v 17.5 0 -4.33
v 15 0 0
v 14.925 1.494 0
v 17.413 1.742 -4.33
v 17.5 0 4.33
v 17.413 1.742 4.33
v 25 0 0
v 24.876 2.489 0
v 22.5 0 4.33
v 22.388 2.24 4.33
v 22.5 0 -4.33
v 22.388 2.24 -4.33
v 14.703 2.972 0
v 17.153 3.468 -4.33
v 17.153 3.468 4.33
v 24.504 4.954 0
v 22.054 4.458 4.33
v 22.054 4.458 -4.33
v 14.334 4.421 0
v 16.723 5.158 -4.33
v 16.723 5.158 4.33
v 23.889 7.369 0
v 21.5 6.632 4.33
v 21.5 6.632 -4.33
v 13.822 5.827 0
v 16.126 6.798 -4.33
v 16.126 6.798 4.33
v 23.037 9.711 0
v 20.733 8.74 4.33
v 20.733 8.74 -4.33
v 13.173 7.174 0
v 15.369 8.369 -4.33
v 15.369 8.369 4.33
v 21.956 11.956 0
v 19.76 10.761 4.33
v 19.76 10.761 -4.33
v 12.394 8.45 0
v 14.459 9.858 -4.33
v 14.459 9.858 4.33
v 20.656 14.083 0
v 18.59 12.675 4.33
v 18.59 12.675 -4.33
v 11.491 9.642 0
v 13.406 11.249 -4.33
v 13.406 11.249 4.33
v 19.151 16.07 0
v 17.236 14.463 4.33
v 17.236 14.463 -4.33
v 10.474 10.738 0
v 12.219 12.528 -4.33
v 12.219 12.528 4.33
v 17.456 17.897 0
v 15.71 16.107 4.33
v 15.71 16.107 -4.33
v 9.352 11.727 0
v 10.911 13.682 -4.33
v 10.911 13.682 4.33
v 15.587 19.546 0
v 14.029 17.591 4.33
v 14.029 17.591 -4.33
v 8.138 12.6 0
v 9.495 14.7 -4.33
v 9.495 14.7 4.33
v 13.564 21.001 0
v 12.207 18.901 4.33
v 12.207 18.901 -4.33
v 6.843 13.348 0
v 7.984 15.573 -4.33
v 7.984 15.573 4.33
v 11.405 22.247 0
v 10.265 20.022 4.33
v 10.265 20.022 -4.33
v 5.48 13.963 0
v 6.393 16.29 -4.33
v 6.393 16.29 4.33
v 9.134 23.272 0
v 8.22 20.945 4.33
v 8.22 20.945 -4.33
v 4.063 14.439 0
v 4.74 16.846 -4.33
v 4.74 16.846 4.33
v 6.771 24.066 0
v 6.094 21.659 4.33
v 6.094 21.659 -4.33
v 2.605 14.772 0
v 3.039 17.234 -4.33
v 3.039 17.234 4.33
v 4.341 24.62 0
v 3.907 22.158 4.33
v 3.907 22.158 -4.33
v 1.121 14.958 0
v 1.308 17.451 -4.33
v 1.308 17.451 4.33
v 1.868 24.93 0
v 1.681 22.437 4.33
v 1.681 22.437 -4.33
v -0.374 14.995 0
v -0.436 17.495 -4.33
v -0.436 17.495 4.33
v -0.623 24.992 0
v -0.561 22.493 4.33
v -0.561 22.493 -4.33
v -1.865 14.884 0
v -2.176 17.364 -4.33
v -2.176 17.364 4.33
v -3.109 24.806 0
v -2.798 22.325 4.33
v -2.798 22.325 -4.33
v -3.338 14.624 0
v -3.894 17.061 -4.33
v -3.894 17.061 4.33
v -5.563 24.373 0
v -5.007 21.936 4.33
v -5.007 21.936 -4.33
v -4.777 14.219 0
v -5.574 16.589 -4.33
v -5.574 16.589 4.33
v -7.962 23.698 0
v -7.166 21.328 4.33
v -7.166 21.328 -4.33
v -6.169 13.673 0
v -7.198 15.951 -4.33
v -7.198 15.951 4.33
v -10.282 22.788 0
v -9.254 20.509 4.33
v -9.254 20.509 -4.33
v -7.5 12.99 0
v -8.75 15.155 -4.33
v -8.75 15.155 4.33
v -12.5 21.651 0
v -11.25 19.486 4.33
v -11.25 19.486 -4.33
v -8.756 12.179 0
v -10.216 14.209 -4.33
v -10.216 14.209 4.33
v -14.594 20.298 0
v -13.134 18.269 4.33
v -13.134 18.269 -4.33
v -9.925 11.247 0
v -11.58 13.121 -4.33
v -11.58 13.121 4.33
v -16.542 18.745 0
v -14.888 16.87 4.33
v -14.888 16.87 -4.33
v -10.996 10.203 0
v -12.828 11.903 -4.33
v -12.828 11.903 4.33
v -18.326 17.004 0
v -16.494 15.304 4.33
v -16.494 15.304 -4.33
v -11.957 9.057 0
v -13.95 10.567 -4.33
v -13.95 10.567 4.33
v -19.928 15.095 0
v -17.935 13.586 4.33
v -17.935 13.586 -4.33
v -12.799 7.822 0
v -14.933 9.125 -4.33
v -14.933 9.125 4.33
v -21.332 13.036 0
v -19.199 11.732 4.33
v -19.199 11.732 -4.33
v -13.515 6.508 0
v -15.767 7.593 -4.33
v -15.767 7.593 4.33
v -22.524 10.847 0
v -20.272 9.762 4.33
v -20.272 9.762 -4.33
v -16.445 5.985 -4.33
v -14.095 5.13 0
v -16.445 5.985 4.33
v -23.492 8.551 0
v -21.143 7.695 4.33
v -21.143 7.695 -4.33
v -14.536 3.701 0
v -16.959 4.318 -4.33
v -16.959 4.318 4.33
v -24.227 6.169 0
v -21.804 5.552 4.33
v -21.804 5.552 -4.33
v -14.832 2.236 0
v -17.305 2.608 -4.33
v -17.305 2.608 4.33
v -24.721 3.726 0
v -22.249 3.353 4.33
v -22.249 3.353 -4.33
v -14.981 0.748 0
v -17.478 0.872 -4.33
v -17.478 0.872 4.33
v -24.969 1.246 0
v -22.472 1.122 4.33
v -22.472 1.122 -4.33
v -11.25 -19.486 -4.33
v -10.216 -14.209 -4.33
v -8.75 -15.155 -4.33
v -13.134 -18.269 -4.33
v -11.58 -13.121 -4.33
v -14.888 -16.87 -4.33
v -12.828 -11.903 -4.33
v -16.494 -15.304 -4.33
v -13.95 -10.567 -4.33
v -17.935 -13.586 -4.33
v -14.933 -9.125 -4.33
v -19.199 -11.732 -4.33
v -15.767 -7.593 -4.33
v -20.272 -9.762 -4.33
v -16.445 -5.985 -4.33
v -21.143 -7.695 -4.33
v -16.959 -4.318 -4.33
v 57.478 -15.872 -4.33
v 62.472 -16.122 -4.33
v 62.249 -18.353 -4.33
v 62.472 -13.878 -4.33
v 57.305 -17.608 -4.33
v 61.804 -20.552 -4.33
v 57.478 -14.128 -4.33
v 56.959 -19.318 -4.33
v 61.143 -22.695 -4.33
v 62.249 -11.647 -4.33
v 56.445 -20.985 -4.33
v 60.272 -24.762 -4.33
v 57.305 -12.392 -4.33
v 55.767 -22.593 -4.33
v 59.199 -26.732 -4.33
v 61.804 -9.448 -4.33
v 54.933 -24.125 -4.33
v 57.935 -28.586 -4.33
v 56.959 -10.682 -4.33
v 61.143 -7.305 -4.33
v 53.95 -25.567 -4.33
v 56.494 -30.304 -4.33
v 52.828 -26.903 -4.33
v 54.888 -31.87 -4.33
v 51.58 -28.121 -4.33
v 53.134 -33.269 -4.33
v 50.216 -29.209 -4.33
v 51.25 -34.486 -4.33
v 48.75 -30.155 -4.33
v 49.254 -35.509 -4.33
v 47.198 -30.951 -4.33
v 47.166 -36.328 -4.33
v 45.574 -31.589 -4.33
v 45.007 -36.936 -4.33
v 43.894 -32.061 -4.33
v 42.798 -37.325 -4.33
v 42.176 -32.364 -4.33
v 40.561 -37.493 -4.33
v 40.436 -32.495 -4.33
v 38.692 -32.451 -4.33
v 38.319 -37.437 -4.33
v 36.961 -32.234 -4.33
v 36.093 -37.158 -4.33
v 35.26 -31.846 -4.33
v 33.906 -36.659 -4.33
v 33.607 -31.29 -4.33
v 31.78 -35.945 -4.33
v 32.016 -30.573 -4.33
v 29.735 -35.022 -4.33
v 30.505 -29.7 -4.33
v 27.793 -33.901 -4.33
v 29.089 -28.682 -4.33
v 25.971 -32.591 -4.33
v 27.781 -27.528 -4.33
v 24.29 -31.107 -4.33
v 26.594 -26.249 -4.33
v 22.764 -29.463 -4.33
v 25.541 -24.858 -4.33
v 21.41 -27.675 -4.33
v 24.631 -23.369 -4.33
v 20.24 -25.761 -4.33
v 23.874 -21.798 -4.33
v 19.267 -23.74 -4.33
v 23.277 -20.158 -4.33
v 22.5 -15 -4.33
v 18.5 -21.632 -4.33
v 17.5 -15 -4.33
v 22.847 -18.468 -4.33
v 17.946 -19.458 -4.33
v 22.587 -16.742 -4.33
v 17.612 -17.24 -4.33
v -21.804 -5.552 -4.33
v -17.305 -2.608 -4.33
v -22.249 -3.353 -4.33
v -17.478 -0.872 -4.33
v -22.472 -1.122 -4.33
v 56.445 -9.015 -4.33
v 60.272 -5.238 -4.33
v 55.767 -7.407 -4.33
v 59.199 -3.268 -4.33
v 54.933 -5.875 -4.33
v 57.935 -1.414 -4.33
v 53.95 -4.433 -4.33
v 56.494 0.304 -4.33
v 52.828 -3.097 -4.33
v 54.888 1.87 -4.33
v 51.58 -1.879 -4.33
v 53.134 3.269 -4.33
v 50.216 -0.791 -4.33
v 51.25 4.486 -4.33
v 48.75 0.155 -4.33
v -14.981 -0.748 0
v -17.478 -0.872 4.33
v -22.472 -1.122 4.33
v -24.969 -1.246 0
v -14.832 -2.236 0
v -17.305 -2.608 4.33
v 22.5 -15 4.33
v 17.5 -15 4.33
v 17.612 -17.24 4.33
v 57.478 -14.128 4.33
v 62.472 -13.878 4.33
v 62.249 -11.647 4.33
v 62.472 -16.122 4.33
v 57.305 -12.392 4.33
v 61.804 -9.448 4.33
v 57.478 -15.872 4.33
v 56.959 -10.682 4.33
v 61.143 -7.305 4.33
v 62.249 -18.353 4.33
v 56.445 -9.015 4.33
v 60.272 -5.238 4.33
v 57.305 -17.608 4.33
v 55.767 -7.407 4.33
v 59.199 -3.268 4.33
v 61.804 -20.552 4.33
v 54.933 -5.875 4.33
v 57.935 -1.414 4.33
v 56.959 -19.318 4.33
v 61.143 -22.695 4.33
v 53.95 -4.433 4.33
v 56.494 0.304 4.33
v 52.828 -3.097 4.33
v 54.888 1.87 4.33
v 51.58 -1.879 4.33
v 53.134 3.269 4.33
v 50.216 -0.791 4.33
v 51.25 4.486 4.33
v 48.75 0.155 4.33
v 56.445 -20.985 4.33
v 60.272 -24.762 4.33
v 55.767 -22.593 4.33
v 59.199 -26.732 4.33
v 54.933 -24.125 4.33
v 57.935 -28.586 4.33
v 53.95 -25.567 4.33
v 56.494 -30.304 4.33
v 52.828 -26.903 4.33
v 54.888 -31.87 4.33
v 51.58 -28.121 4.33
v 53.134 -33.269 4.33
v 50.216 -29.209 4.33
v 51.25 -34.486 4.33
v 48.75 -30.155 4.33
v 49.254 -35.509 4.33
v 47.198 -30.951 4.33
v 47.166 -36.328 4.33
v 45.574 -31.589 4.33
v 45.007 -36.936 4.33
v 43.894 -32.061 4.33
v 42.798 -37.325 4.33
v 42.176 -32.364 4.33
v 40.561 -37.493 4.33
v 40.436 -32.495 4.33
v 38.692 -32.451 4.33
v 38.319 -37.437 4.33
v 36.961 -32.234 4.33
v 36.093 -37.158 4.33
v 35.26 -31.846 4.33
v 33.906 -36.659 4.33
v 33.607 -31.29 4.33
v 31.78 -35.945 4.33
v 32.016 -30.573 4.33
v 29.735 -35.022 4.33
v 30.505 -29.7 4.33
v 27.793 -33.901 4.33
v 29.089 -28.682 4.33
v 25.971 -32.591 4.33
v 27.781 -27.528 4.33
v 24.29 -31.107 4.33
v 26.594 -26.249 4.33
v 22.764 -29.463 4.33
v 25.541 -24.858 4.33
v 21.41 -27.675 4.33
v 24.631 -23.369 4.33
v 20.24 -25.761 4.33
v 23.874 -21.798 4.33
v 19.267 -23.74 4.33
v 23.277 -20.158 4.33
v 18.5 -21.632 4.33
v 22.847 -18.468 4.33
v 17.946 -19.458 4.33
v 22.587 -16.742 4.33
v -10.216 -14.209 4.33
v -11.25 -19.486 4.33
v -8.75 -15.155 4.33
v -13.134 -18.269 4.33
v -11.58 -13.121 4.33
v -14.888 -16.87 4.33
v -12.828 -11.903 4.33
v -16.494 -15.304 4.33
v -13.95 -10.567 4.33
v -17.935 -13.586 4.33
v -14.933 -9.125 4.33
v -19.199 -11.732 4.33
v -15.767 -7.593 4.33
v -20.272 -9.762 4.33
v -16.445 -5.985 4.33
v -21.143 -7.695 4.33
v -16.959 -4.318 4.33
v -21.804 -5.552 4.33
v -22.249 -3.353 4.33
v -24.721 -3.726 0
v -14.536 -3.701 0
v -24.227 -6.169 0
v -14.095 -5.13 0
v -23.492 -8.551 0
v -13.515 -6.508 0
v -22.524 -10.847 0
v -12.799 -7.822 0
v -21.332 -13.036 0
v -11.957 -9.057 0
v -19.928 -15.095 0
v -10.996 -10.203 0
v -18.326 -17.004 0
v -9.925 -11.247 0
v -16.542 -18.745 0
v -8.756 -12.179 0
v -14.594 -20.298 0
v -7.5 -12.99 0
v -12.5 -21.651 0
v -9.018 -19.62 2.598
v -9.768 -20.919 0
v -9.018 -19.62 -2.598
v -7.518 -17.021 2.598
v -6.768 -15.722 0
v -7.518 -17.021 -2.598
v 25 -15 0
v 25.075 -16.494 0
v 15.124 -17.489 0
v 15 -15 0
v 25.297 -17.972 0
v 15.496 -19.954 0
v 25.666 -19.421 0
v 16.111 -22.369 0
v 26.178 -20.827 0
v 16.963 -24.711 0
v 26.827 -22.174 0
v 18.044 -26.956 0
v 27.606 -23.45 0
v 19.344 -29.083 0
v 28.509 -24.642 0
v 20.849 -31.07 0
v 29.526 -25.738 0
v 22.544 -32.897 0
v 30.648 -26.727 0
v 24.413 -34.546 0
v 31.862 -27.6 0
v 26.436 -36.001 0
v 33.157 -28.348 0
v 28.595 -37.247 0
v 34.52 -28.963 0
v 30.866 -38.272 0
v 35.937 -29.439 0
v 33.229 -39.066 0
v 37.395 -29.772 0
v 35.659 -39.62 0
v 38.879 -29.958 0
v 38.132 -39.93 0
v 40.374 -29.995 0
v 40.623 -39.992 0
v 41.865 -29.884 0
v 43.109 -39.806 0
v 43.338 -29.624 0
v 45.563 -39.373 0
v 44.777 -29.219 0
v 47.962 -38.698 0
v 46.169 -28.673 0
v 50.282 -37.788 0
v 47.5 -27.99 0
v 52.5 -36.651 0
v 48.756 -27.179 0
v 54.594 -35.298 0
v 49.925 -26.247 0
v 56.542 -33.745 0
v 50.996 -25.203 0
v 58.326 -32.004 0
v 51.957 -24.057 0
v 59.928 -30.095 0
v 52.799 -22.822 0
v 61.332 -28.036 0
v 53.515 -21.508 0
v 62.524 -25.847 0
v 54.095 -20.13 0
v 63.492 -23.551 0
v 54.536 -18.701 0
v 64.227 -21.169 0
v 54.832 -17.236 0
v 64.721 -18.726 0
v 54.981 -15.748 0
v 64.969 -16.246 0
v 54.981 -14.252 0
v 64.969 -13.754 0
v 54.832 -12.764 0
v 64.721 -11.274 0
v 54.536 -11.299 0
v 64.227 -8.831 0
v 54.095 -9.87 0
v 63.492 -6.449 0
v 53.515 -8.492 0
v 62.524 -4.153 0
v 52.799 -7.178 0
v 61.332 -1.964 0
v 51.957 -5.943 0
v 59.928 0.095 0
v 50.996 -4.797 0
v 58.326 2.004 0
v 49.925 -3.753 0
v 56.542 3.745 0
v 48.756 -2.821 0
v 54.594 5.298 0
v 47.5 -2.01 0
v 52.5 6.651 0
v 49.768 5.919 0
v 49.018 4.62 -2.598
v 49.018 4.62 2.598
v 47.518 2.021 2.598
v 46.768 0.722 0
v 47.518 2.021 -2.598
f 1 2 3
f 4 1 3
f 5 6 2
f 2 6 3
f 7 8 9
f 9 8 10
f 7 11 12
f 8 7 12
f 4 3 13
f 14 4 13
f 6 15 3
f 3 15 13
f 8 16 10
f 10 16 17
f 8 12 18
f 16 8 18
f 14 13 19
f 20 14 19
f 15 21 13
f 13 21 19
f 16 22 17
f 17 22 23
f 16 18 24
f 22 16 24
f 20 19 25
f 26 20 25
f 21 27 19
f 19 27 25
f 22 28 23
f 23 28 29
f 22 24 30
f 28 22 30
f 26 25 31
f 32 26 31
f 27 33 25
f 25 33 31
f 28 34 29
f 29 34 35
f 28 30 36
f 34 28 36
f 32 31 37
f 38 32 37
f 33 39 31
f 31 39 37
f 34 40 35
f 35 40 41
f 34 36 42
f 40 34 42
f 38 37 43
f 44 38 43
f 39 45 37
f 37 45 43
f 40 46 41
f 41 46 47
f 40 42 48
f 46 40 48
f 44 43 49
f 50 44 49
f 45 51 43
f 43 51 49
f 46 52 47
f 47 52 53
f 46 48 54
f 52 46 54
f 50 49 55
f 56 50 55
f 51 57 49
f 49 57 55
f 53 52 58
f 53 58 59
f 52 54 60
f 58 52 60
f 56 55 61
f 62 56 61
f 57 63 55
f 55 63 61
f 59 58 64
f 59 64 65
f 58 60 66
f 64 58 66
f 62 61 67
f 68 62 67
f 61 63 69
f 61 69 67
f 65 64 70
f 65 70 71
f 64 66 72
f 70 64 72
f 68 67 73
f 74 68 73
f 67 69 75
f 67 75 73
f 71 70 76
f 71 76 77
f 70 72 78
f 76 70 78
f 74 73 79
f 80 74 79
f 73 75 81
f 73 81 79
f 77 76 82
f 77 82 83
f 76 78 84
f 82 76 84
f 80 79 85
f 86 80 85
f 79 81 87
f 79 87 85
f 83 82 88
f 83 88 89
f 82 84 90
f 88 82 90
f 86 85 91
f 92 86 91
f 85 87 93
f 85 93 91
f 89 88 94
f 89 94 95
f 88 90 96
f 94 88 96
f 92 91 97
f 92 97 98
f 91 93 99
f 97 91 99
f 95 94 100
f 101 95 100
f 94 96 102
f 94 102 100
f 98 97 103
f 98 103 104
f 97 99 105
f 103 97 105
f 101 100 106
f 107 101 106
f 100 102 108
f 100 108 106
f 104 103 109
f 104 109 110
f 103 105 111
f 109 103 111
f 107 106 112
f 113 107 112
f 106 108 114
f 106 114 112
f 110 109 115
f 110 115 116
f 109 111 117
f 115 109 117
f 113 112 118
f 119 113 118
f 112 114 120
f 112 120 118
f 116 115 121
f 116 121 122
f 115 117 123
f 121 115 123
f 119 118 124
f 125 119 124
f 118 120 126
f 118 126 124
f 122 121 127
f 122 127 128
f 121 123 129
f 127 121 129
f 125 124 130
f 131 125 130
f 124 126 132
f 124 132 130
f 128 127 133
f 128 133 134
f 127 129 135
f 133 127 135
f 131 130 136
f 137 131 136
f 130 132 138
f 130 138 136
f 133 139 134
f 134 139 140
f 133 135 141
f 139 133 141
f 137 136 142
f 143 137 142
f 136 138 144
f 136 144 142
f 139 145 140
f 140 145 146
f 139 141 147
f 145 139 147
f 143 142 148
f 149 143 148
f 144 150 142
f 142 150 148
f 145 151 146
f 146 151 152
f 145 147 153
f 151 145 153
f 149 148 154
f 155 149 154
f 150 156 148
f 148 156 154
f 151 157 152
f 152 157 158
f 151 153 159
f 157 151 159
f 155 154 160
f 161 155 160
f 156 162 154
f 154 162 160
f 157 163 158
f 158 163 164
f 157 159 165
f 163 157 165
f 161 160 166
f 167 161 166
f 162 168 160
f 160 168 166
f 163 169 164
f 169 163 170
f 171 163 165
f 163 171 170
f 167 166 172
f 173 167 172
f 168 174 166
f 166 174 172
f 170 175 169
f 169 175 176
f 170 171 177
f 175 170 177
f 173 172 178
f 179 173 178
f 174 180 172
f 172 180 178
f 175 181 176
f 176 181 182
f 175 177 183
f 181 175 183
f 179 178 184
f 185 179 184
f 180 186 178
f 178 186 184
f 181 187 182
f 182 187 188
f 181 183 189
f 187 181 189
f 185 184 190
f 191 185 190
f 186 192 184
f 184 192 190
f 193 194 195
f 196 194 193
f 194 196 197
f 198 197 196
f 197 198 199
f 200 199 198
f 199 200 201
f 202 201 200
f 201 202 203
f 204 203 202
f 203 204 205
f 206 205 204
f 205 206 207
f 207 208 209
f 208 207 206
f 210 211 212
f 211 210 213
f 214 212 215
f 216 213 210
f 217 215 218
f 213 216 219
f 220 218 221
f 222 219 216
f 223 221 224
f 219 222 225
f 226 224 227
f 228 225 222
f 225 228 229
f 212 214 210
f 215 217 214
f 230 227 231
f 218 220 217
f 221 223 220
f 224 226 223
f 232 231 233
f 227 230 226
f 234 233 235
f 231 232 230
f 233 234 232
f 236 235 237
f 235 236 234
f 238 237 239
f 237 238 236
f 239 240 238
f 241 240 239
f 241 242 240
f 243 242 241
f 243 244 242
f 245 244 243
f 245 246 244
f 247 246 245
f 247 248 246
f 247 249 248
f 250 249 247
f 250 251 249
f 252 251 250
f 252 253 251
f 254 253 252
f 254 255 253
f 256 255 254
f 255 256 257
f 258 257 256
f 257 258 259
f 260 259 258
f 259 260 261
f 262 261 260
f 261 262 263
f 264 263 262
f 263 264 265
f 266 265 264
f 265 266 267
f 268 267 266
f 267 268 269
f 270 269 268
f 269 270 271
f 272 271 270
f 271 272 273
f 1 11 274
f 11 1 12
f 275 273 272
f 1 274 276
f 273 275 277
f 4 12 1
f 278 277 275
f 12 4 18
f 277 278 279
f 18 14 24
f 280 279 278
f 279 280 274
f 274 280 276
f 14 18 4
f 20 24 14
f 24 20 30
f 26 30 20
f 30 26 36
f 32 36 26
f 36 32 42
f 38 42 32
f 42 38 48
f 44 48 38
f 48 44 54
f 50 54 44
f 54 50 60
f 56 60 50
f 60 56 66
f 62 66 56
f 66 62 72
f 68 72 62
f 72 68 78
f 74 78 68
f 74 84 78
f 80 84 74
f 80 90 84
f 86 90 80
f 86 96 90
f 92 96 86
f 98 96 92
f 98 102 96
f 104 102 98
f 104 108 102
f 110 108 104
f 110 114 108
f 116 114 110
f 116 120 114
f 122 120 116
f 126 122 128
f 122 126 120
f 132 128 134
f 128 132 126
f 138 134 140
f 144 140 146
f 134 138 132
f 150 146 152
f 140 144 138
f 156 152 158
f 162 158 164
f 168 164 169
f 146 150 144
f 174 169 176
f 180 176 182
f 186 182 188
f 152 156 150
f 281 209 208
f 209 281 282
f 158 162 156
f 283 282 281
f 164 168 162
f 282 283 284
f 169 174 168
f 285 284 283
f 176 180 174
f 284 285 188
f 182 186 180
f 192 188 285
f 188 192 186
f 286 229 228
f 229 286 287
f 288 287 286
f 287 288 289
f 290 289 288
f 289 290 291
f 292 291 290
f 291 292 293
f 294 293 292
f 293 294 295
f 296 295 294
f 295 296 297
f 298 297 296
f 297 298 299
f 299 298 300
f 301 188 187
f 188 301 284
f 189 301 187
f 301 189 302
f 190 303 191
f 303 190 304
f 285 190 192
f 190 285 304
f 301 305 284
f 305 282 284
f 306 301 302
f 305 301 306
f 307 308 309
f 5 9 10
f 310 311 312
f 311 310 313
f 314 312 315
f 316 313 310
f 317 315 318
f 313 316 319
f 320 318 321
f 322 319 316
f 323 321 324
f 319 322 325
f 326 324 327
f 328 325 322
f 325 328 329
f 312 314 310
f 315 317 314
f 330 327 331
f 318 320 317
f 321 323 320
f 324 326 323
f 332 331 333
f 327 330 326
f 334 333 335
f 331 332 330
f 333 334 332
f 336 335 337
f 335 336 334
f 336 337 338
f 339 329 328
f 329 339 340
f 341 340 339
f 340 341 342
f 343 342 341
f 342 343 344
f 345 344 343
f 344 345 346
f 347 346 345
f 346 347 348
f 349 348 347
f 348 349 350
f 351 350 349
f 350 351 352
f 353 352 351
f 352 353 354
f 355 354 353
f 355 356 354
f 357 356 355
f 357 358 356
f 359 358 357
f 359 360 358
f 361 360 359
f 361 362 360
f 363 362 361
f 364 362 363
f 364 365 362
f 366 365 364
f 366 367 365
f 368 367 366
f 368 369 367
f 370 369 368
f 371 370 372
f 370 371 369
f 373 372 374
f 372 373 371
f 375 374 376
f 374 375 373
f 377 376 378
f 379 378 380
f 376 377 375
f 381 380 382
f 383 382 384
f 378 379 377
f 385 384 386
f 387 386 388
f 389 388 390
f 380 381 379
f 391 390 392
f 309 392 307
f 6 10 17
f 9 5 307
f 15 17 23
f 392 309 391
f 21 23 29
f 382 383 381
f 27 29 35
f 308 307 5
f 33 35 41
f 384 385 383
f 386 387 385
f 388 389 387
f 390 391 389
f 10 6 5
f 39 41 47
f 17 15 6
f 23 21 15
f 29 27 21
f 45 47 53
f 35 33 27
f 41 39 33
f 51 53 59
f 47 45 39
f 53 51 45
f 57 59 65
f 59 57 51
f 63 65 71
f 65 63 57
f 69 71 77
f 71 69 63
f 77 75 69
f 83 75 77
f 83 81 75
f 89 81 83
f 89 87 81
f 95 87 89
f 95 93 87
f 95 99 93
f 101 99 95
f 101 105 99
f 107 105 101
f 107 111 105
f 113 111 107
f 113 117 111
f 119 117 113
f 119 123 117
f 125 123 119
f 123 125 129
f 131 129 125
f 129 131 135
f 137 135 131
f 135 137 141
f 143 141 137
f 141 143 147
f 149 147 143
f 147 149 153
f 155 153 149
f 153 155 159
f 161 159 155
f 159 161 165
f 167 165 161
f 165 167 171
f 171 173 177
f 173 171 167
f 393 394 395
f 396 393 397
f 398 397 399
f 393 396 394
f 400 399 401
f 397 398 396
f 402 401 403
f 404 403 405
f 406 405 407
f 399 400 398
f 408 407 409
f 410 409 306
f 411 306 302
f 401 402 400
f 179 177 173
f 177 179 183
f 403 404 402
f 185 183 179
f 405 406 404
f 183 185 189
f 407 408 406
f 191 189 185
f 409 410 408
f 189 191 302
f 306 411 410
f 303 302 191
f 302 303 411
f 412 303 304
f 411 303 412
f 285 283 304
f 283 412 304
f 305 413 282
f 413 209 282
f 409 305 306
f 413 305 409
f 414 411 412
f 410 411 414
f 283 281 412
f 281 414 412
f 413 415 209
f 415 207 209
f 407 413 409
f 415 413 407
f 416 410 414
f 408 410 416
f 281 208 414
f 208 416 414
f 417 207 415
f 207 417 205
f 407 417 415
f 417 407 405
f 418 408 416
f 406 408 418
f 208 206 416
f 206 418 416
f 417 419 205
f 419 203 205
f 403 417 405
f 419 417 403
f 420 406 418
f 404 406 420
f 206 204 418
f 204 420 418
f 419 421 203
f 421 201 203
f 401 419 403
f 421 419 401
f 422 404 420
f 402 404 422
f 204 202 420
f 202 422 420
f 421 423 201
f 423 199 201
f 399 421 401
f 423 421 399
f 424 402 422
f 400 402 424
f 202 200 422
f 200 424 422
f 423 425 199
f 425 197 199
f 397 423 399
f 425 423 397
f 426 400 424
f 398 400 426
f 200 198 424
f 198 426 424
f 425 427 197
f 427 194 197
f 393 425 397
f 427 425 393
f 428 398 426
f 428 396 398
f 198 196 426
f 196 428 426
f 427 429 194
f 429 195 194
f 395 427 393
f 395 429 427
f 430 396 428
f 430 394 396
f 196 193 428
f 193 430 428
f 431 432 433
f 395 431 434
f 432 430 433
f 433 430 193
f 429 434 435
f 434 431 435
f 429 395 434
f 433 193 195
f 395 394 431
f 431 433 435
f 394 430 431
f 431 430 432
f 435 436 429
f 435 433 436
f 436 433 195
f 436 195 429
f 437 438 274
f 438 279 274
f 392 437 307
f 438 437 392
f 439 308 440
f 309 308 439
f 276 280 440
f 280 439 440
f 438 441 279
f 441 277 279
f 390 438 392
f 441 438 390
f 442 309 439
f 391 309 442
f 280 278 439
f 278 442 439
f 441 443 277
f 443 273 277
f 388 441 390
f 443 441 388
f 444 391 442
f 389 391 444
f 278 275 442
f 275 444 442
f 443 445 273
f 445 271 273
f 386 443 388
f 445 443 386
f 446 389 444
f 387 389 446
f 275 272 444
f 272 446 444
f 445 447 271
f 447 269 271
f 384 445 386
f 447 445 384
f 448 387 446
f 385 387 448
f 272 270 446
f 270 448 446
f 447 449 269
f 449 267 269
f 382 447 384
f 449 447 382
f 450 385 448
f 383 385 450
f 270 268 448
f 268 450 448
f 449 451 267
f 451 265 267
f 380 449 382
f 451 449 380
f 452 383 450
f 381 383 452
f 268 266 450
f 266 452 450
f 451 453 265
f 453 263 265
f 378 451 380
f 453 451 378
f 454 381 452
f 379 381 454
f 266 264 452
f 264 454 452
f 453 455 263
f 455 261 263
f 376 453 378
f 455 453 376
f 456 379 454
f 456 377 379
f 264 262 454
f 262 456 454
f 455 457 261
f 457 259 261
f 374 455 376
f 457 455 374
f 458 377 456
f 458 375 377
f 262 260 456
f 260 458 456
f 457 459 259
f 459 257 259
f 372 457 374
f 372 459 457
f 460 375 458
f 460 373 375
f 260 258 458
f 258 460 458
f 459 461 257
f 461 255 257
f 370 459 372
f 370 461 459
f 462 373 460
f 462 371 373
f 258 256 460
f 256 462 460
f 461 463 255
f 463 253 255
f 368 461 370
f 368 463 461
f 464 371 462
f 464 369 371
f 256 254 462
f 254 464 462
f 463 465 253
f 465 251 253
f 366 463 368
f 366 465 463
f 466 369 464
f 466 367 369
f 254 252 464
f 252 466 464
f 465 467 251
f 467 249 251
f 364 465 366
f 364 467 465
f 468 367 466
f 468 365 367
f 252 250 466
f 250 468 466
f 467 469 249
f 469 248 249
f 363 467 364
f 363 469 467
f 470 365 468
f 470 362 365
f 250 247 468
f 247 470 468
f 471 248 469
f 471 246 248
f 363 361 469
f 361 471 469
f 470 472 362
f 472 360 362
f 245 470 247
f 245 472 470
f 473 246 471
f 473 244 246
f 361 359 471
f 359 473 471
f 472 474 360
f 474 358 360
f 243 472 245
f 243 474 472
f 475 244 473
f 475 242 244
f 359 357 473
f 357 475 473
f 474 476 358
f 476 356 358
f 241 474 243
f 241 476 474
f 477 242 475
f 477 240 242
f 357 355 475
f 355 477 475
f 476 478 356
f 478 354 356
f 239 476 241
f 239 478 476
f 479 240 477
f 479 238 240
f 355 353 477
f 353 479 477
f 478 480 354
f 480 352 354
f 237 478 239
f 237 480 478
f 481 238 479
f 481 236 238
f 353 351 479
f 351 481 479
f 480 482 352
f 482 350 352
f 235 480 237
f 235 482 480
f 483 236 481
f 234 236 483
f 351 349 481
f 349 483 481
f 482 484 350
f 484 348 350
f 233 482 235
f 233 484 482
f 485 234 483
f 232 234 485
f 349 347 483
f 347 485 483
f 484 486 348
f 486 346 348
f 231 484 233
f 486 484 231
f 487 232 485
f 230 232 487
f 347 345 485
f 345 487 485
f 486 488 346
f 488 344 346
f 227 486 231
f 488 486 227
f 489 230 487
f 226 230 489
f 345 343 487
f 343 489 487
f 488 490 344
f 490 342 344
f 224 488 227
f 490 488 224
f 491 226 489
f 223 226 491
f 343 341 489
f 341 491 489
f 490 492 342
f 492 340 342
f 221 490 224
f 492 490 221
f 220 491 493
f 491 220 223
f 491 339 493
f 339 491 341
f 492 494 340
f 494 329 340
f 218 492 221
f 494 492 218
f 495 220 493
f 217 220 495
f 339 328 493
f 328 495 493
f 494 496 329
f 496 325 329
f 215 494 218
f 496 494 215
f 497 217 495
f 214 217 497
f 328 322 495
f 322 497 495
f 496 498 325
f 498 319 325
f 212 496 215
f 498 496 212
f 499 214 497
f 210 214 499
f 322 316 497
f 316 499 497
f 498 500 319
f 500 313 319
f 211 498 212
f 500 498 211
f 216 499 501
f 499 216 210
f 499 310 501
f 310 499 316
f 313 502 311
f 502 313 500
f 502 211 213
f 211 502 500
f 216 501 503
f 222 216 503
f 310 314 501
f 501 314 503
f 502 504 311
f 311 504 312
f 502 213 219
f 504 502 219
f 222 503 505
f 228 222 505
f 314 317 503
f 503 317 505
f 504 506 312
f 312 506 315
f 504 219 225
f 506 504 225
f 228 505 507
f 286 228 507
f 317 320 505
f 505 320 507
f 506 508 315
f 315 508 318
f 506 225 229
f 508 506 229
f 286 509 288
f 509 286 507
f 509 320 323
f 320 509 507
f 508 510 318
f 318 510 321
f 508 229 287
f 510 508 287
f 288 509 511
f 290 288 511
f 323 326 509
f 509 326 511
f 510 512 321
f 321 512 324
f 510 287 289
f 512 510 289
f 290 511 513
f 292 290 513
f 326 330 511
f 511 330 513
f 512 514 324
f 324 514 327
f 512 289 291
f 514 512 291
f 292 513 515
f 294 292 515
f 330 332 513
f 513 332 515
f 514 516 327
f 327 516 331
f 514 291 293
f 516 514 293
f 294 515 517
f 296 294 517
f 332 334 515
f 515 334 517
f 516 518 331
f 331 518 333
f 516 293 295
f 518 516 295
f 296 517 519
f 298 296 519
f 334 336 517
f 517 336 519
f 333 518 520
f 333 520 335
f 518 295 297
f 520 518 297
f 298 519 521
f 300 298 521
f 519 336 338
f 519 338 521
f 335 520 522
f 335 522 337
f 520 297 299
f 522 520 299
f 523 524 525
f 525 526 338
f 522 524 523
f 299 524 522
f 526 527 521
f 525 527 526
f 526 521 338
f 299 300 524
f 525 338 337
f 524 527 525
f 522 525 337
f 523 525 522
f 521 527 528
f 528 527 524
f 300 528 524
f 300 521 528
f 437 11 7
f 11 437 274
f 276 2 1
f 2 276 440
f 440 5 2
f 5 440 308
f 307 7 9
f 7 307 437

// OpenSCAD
// [FL_INDEX: keywords="openscad, 3d_parametric, Simple_S_Hook_V2, csg_solid" | COT="Parametric OpenSCAD design from 3DCodeverse"]
// Title: Simple S Hook V2

/*Simple S Hook by Mike Thomnpson 24/12/2023
Revision 2.0 with improved strength and customization*/

/* [Radius] */
//Profile radius - increase for heavier loads along with increased perimeters, top and bottom layers when printing
profile_radius = 5; 
//Top Radius - size of top section measured from centre of circle to centre of material
top_radius = 20;
//Bottom radius - size of bottom section measured from centre of circle to centre of material
bottom_radius = 20;

/* [Closure Angle] */
//Top closure angle - increase for tighter gap
top_closure_angle = 240;
//Bottom closure angle - increase for tighter gap
bottom_closure_angle = 240;

/* [Connector Length] */
//Connector length - adjust for extended gap between top and bottom of hook
connector_length = 15;

/* [Hidden] */
$fn=64;

top();
connector();
bottom();
//oval_profile();

module hex_profile()
{
    $fn=6;
    circle(r=profile_radius);
}

//experimental - not currently used
module oval_profile()
{ 
    oval_height =10; //y axis
    oval_depth = 10; //x axis
    polygon(points=[[-oval_depth/2,-oval_height/2],[oval_depth/2-2,-oval_height/2],[oval_depth/2,-oval_height/2+2],[oval_depth/2,oval_height/2-2],[oval_depth/2-2,oval_height/2],[-oval_depth/2+2,oval_height/2],[-oval_depth/2,oval_height/2-2],[-oval_depth/2,-oval_height/2+2],[-oval_depth/2+2,-oval_height/2]]);
}

module top()
{
    rotate_extrude(angle=top_closure_angle,convexity = 10)translate([top_radius, 0, 0])hex_profile();
    end_cap_top();
}

module bottom()
{
    translate([top_radius*2-(top_radius-bottom_radius),-connector_length,0])rotate([0,0,180])
    {
        rotate_extrude(angle=bottom_closure_angle,convexity = 10)translate([bottom_radius, 0, 0])hex_profile();
        end_cap_bottom();
    }
}

module connector()
{
    translate([top_radius,0,0])rotate([90,0,0])linear_extrude(connector_length, convexity = 10)hex_profile();
}

module end_cap_top()
{
    $fn=6;
    rotate([0,0,top_closure_angle])translate([top_radius,0,0])rotate([-90,0,0])cylinder(r1=profile_radius,r2=profile_radius-2,h=2);
}

module end_cap_bottom()
{
    $fn=6;
    rotate([0,0,bottom_closure_angle])translate([bottom_radius,0,0])rotate([-90,0,0])cylinder(r1=profile_radius,r2=profile_radius-2,h=2);
}
